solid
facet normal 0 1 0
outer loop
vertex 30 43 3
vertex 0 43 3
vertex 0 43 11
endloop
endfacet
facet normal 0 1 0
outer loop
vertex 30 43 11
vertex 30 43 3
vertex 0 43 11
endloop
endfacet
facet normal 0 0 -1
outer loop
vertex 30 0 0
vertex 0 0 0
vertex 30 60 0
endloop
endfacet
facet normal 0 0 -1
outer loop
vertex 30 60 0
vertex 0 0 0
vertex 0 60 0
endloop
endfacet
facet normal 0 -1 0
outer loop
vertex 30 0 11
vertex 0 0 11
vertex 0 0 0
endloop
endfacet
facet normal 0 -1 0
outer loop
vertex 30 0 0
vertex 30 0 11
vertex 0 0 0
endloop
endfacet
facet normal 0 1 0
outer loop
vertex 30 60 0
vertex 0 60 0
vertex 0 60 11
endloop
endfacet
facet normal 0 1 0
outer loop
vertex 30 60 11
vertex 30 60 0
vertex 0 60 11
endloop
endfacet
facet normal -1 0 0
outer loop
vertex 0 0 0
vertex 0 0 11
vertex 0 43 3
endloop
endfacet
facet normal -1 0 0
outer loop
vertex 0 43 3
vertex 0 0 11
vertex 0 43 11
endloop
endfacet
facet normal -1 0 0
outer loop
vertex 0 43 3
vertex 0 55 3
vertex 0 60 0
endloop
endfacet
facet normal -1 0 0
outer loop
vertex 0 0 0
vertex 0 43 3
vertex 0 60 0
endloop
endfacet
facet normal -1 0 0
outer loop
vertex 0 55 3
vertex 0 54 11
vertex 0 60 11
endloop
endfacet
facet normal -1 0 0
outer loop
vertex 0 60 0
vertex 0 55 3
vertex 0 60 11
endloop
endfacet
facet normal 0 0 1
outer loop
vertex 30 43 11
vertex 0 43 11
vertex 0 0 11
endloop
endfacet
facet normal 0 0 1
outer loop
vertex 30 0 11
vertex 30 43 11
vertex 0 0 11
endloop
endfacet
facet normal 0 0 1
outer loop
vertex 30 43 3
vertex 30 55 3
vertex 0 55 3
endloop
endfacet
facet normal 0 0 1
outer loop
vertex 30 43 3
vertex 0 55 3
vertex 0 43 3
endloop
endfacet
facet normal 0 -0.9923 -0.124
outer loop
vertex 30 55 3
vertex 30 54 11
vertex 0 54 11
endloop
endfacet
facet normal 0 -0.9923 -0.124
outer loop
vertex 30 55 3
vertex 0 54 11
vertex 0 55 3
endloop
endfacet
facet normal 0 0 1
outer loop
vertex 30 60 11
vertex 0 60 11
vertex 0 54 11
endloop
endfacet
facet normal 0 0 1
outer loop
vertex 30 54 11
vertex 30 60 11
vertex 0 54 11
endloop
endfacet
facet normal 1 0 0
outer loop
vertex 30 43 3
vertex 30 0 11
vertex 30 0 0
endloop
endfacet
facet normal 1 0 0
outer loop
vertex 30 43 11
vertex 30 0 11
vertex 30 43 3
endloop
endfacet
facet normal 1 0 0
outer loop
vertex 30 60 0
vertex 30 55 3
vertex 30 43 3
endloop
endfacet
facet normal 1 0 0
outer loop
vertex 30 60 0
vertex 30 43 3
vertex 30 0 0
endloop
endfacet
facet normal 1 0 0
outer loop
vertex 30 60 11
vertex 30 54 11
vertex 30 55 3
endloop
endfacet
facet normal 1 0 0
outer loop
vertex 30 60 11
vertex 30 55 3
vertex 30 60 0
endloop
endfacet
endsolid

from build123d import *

# Parameters (mm, degrees)
PAD_DEPTH = 30


with BuildPart() as part:
    # Sketch → Pad (new body)
    with BuildSketch(Plane.YZ):
        Polygon((0, 0), (60, 0), (60, 11), (54, 11), (55, 3), (43, 3), (43, 11), (0, 11), align=None)
    extrude(amount=PAD_DEPTH)


solid = part.part
